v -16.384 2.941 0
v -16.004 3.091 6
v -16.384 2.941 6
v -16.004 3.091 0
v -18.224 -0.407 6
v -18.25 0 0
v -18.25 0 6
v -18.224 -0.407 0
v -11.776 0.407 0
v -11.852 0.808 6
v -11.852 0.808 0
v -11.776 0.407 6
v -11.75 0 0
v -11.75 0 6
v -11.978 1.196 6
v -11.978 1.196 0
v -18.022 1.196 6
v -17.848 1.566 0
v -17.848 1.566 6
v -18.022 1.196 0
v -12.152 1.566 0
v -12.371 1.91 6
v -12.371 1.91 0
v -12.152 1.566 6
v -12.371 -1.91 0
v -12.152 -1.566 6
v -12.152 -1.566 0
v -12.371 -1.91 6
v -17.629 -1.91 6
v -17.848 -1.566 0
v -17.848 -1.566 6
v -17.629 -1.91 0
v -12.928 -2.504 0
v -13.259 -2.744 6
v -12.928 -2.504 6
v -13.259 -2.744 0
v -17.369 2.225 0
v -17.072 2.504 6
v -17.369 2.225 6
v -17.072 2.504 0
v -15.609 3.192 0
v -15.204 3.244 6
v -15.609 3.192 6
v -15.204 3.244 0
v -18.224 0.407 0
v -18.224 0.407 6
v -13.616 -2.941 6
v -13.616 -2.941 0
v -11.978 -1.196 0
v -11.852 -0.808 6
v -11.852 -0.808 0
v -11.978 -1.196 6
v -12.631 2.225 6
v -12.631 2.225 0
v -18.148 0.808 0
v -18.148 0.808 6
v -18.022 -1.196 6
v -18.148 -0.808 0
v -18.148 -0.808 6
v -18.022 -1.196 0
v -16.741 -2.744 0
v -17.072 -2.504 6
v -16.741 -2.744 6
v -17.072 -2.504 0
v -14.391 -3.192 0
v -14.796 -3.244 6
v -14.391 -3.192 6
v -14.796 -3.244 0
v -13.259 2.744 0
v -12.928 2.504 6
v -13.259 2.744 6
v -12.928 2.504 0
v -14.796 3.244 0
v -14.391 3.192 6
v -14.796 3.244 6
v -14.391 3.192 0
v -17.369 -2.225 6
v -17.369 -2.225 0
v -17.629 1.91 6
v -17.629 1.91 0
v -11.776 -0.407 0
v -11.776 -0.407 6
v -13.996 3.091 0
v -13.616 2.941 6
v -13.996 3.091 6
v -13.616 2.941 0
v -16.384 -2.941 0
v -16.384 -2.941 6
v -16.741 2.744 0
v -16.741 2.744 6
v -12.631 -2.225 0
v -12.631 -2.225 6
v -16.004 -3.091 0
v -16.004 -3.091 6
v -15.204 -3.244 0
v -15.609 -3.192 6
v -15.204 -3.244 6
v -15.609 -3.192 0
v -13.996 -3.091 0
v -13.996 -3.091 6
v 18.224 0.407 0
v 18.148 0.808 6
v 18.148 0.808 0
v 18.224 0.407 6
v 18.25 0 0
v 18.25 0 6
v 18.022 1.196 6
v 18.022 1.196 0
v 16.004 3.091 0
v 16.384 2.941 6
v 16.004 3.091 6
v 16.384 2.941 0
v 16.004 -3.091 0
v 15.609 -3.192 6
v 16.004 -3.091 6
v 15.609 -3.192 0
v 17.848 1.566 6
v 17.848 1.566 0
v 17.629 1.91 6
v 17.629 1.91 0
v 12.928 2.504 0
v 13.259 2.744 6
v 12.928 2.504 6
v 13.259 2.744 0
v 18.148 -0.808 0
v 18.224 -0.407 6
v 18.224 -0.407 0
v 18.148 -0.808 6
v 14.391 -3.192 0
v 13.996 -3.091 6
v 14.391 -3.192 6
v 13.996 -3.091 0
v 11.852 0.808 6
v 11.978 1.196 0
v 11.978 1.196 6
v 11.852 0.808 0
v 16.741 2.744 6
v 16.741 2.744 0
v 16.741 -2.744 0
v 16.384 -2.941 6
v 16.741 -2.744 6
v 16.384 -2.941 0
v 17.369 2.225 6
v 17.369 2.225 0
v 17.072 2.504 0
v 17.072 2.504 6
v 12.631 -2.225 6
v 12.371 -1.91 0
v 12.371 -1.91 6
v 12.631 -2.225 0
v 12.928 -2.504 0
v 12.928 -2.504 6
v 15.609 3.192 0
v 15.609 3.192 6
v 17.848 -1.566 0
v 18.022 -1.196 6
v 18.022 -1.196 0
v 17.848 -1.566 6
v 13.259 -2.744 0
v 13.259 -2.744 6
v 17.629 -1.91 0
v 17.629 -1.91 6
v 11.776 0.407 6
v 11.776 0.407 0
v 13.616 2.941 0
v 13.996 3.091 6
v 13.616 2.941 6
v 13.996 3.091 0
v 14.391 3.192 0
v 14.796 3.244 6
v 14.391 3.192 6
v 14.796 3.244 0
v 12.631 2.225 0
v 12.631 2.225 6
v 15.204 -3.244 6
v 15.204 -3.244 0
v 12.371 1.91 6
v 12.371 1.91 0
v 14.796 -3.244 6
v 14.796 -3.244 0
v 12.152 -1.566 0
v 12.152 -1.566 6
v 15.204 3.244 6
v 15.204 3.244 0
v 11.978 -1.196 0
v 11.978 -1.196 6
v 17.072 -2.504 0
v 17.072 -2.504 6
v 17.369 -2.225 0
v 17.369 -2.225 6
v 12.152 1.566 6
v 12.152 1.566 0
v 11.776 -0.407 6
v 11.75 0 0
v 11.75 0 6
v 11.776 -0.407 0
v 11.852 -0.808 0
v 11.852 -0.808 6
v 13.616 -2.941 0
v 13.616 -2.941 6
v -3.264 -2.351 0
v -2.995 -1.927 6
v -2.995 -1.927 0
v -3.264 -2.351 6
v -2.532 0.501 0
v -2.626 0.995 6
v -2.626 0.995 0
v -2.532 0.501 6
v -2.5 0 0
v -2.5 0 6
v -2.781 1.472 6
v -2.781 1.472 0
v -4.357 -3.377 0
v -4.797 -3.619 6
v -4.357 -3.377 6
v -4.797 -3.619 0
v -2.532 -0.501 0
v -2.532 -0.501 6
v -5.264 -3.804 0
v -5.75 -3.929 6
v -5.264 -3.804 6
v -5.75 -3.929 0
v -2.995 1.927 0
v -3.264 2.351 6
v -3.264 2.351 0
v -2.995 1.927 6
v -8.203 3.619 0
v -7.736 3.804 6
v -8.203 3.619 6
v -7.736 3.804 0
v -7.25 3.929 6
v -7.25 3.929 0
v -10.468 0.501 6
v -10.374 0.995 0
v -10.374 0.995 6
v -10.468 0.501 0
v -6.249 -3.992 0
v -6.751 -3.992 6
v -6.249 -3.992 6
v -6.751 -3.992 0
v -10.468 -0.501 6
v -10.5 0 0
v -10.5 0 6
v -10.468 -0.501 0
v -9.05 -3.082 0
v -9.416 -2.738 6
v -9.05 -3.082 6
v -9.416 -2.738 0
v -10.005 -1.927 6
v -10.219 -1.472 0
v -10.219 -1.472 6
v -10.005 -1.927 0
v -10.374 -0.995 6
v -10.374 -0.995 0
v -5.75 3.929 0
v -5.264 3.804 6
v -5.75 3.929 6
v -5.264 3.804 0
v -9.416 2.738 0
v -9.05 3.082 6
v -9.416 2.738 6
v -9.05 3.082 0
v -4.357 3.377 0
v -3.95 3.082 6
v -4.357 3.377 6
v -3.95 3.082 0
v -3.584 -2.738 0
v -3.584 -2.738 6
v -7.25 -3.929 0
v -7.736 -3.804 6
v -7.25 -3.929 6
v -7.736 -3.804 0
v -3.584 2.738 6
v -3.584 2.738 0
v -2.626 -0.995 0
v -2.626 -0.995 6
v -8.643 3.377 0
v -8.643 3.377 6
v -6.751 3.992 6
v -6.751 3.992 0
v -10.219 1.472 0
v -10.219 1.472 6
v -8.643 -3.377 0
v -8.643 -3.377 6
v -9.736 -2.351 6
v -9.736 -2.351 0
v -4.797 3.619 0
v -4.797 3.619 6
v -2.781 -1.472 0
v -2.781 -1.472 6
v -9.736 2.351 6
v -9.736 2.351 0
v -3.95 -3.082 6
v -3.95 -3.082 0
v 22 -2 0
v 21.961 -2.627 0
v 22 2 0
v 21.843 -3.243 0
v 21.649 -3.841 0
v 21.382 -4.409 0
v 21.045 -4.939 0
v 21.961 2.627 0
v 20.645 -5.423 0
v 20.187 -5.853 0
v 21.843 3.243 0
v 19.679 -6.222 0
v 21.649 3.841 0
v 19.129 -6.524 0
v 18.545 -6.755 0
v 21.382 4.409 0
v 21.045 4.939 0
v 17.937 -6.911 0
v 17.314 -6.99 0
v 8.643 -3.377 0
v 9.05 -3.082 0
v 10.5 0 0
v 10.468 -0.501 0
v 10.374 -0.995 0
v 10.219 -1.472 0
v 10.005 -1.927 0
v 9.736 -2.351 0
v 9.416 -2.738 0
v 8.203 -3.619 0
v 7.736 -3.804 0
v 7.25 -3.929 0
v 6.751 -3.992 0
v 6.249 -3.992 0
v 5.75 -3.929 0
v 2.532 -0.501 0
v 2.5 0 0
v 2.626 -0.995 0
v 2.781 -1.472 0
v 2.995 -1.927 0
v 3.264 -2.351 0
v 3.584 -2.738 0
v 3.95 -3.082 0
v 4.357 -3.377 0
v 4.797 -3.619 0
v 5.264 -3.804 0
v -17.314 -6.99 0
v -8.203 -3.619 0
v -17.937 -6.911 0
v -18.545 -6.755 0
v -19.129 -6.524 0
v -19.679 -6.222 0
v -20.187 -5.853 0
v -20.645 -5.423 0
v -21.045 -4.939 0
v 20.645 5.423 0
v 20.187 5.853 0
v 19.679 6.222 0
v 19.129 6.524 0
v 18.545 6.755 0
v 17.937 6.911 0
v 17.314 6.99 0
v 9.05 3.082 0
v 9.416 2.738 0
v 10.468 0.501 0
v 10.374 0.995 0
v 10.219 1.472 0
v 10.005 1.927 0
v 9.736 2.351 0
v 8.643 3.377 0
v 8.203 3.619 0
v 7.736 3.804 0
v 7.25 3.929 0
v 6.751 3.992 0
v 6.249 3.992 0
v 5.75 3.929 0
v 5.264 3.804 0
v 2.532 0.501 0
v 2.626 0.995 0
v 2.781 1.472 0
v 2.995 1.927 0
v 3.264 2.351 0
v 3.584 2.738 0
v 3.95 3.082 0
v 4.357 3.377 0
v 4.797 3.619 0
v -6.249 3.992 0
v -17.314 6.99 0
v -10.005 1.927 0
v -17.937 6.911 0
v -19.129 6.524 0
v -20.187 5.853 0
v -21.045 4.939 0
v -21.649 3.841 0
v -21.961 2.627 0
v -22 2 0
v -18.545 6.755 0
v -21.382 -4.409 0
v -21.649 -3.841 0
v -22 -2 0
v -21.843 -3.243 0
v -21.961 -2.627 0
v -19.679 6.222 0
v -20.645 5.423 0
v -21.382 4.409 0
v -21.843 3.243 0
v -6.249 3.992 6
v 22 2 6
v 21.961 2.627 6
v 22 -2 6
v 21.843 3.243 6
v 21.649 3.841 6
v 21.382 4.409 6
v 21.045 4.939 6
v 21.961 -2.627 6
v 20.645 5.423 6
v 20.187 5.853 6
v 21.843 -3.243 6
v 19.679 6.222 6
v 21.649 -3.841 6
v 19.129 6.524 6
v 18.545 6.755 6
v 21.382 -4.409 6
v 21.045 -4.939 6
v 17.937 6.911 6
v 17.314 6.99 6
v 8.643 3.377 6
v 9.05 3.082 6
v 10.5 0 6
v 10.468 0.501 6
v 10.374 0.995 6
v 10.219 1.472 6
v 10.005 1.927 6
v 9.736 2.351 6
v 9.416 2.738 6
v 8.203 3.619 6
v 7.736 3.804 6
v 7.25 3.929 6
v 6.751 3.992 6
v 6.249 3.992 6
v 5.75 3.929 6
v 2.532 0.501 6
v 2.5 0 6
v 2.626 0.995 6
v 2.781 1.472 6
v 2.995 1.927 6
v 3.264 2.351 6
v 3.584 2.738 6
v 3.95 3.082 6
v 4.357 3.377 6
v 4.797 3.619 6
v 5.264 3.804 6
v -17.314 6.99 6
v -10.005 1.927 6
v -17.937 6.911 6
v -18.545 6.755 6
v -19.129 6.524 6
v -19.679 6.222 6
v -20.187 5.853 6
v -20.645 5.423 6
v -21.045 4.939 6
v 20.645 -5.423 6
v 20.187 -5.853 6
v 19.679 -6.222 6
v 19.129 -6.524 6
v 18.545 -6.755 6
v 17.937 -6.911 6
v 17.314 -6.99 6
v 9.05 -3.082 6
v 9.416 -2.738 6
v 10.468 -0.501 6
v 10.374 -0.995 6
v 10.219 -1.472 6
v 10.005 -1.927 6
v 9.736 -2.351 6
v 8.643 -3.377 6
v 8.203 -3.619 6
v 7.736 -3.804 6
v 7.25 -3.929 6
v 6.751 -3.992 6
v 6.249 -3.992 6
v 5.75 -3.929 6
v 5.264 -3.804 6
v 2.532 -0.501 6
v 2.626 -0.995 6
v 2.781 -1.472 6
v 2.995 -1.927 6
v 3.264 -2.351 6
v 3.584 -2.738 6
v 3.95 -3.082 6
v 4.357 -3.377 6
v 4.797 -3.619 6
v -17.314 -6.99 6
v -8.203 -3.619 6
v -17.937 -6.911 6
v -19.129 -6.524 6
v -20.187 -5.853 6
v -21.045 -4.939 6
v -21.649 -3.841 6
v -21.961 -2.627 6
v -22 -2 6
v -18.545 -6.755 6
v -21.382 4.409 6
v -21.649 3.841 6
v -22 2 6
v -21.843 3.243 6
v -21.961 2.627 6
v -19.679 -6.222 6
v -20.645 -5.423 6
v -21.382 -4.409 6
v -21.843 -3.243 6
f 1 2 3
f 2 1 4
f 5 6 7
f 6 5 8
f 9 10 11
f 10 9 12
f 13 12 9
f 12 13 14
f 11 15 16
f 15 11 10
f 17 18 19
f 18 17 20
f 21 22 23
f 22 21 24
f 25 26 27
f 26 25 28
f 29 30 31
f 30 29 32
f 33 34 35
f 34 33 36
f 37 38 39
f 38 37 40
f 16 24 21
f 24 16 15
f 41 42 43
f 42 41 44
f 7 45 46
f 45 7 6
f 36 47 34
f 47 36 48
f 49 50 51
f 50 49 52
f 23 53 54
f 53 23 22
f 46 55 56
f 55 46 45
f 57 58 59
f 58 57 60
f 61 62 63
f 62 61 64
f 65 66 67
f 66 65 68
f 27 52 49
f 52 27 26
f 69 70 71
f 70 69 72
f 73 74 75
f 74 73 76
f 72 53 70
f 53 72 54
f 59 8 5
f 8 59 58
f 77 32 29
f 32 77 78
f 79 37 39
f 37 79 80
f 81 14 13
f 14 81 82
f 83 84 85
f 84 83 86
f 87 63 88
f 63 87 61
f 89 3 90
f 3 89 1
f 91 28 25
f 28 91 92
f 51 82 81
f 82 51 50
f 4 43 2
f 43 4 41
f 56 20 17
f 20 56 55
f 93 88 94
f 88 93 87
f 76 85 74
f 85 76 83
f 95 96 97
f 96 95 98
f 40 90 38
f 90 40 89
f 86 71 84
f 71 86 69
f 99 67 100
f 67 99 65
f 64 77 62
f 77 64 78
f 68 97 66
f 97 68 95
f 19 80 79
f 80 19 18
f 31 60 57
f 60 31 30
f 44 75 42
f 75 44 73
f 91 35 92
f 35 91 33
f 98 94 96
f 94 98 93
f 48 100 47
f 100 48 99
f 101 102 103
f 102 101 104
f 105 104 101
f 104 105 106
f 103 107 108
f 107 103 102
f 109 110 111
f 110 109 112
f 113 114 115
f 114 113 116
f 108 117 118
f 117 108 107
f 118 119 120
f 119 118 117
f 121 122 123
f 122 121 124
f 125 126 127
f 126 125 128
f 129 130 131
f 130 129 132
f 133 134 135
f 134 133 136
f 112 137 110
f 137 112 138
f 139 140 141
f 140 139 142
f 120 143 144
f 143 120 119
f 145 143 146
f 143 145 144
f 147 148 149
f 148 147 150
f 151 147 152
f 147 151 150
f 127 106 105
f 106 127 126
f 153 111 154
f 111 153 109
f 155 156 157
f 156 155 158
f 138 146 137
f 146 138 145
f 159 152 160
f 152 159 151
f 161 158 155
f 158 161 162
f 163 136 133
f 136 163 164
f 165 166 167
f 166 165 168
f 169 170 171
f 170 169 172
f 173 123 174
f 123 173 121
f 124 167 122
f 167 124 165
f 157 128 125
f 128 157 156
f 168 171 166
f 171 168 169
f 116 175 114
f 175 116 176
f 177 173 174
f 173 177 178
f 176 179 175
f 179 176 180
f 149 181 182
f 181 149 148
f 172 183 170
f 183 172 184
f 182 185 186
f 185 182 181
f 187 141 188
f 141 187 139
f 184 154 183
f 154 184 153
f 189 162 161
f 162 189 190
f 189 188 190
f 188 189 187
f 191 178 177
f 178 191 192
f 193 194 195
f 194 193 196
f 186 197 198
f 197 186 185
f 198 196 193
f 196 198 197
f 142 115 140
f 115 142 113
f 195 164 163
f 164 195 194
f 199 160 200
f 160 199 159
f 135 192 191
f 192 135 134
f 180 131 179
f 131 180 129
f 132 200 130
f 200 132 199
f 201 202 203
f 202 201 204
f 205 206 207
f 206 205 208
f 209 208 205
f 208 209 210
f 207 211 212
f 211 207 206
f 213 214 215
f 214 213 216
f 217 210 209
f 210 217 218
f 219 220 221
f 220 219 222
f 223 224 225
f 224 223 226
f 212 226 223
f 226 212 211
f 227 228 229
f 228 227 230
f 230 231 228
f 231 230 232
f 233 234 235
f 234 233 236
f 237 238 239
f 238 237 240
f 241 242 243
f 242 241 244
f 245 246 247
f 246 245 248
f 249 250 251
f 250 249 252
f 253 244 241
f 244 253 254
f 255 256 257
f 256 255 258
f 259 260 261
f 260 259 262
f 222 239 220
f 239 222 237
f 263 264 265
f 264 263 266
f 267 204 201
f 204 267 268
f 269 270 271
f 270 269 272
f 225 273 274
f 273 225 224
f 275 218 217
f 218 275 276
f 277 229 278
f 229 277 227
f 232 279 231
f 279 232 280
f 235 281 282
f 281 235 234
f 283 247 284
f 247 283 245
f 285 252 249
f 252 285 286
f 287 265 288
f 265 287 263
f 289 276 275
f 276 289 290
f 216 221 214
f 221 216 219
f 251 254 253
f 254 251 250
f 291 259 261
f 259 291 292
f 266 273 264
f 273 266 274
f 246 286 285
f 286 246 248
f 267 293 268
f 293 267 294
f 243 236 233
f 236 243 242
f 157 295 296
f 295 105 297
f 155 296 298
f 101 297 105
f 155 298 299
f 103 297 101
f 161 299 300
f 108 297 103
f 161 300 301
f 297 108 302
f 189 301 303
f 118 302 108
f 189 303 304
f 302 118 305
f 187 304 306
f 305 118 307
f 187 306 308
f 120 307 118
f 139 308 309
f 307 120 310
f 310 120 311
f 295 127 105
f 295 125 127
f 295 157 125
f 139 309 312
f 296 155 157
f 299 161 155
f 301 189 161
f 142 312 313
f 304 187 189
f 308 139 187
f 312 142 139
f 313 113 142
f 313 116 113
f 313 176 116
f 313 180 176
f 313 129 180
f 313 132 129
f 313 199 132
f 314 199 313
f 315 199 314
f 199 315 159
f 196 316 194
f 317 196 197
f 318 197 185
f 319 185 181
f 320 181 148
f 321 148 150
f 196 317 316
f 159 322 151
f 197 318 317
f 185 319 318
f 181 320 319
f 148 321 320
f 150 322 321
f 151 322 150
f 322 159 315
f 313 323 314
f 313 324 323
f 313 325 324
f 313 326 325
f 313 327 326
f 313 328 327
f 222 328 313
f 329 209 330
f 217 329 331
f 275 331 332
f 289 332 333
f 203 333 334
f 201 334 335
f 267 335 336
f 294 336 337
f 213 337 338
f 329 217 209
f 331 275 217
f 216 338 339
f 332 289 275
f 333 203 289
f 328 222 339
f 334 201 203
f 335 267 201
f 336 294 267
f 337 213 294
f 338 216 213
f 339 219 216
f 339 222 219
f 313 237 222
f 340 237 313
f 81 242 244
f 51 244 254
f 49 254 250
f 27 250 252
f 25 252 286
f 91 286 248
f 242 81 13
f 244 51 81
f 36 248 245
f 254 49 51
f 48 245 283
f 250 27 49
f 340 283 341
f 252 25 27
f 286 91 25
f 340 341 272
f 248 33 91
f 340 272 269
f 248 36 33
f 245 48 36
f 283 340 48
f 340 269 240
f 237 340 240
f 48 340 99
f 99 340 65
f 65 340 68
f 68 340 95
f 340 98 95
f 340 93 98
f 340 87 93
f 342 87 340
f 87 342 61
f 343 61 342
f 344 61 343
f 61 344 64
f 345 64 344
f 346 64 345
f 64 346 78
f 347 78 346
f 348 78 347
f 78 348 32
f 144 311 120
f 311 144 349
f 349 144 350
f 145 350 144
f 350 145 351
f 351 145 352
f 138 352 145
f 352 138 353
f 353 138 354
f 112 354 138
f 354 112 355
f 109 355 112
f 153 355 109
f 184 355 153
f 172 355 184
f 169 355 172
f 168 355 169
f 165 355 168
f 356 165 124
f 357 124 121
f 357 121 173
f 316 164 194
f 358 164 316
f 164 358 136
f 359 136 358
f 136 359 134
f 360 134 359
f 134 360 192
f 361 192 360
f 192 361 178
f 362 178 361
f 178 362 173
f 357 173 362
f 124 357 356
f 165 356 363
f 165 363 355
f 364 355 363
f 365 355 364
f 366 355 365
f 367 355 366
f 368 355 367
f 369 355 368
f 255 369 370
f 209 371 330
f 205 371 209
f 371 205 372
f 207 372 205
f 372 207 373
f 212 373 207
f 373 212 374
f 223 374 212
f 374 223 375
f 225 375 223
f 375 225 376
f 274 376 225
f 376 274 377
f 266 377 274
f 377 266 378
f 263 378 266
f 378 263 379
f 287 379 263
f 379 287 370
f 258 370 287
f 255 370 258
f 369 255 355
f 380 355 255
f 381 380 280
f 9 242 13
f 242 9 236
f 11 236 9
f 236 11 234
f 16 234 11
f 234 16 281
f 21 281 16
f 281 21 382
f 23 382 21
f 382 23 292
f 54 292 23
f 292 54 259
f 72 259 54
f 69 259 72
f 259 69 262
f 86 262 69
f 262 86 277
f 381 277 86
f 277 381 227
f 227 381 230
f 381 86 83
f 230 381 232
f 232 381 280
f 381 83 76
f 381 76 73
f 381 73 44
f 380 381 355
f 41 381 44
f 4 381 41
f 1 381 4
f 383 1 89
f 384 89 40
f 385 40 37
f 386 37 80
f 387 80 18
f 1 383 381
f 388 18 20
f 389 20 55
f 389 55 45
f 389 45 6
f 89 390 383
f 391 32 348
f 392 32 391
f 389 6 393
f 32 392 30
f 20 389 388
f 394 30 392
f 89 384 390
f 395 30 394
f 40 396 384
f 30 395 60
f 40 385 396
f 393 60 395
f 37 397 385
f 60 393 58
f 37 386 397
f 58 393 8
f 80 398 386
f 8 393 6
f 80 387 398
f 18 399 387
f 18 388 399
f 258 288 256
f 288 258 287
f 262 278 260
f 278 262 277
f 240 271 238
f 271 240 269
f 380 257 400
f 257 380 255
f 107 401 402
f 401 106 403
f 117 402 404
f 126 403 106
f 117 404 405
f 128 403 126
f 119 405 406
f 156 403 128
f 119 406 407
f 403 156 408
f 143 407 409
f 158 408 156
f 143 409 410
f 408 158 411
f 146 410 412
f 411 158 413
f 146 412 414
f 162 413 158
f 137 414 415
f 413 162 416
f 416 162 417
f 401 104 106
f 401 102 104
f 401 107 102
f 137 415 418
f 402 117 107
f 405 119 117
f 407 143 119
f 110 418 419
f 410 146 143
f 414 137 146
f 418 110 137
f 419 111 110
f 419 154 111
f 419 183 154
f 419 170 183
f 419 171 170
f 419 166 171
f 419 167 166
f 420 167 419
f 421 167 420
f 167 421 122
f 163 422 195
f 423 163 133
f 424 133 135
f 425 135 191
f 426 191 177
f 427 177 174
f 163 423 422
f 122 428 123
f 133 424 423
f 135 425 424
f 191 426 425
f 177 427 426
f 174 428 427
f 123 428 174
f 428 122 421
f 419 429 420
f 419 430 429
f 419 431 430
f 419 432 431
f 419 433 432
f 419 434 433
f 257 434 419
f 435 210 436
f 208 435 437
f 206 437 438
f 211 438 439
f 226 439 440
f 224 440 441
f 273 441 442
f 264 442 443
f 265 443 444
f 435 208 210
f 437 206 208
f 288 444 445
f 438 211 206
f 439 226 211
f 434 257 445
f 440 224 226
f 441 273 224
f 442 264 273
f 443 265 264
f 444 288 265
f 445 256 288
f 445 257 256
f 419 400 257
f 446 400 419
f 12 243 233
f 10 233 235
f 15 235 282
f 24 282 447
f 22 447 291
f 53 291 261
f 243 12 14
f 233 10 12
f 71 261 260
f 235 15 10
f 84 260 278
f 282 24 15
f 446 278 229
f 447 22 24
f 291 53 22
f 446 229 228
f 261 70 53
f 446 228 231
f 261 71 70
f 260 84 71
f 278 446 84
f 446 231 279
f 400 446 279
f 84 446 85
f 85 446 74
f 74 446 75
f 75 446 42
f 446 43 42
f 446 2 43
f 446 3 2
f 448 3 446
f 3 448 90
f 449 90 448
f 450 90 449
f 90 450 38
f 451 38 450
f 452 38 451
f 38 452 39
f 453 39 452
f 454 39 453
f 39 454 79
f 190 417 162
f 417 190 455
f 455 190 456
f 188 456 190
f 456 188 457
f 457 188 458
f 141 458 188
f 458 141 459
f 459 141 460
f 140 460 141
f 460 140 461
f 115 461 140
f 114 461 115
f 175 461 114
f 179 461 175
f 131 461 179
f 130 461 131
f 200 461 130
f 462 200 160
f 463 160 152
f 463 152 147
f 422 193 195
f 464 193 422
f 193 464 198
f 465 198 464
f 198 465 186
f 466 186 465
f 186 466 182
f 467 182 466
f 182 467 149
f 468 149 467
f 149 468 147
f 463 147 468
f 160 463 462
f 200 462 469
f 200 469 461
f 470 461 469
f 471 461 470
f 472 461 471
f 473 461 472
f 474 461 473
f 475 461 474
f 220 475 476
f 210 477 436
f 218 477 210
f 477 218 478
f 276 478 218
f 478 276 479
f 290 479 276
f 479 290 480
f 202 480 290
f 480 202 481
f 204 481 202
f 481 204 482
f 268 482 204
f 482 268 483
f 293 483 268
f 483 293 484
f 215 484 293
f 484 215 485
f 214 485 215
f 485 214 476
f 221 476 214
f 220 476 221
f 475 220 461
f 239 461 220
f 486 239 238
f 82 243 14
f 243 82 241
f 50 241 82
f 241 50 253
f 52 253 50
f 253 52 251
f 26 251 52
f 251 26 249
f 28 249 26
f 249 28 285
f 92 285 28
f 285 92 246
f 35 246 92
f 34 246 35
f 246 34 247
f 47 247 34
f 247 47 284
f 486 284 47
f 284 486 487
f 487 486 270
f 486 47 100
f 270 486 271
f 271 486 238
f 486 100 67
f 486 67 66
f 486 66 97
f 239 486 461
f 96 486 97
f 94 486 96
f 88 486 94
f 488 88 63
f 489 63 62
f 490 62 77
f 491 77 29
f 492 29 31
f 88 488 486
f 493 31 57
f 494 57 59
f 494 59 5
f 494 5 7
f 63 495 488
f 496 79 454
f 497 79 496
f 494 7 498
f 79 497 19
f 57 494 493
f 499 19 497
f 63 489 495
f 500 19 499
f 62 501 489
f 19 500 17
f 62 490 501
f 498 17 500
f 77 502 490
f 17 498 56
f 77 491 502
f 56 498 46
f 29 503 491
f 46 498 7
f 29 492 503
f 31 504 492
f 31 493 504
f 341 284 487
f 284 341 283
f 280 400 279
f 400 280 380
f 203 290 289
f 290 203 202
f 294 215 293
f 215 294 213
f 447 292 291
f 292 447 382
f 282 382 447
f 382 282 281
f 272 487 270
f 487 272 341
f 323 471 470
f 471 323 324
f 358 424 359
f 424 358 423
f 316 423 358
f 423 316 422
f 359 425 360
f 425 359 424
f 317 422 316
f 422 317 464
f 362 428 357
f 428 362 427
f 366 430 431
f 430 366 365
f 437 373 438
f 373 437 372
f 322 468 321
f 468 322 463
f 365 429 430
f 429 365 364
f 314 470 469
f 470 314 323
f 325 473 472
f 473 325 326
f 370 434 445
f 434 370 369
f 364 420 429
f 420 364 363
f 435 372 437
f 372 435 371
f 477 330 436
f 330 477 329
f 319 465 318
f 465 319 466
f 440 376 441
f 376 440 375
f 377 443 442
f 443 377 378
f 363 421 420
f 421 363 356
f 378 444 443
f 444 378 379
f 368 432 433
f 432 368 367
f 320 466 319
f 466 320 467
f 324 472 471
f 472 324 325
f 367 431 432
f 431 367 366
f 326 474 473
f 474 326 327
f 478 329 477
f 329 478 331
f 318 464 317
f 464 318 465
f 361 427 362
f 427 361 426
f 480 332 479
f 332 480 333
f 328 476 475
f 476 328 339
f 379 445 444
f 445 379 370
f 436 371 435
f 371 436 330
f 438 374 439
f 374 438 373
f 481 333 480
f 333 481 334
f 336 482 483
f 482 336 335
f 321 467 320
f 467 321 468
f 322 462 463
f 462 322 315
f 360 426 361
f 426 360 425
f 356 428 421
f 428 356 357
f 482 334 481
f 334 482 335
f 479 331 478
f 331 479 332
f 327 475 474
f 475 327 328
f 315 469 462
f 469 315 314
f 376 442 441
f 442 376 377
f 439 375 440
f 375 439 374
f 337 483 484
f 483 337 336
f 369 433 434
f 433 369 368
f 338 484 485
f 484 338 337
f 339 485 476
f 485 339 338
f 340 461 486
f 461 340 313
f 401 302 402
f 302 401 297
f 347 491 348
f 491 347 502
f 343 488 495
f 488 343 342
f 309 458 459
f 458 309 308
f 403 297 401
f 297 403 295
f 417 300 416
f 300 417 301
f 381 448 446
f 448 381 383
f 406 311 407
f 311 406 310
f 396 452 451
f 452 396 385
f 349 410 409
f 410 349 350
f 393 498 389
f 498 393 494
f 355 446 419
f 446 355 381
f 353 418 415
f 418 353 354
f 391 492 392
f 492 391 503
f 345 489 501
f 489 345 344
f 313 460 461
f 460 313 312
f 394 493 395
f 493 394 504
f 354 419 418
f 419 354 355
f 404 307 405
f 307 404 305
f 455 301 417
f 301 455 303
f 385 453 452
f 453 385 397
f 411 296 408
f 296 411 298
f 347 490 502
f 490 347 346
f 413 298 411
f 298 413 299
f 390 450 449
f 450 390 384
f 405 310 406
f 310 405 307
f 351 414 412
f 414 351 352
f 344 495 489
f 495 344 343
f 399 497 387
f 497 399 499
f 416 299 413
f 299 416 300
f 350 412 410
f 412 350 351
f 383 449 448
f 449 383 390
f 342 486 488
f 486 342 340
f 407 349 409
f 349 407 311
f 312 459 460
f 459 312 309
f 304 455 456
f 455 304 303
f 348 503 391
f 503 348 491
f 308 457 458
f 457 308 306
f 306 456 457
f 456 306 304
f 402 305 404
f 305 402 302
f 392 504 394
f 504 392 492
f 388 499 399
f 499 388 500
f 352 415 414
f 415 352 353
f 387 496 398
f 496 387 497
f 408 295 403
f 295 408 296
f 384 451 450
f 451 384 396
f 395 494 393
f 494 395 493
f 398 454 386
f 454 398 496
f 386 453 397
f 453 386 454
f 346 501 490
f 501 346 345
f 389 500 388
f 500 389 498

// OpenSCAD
$fn = 50;


difference() {
	union() {
		hull() {
			translate(v = [-17.0000000000, 2.0000000000, 0]) {
				cylinder(h = 6, r = 5);
			}
			translate(v = [17.0000000000, 2.0000000000, 0]) {
				cylinder(h = 6, r = 5);
			}
			translate(v = [-17.0000000000, -2.0000000000, 0]) {
				cylinder(h = 6, r = 5);
			}
			translate(v = [17.0000000000, -2.0000000000, 0]) {
				cylinder(h = 6, r = 5);
			}
		}
	}
	union() {
		#translate(v = [-15.0000000000, 0.0000000000, 0]) {
			cylinder(h = 6, r = 3.2500000000);
		}
		#translate(v = [15.0000000000, 0.0000000000, 0]) {
			cylinder(h = 6, r = 3.2500000000);
		}
		#translate(v = [-15.0000000000, 0.0000000000, -100.0000000000]) {
			cylinder(h = 200, r = 3.2500000000);
		}
		#translate(v = [-15.0000000000, 0.0000000000, -100.0000000000]) {
			cylinder(h = 200, r = 3.2500000000);
		}
		#translate(v = [15.0000000000, 0.0000000000, -100.0000000000]) {
			cylinder(h = 200, r = 3.2500000000);
		}
		#translate(v = [15.0000000000, 0.0000000000, -100.0000000000]) {
			cylinder(h = 200, r = 3.2500000000);
		}
		#translate(v = [-15.0000000000, 0.0000000000, 0]) {
			cylinder(h = 6, r = 1.8000000000);
		}
		#translate(v = [15.0000000000, 0.0000000000, 0]) {
			cylinder(h = 6, r = 1.8000000000);
		}
		#translate(v = [-15.0000000000, 0.0000000000, 0]) {
			cylinder(h = 6, r = 1.8000000000);
		}
		#translate(v = [15.0000000000, 0.0000000000, 0]) {
			cylinder(h = 6, r = 1.8000000000);
		}
		#translate(v = [-15.0000000000, 0.0000000000, 0]) {
			cylinder(h = 6, r = 1.8000000000);
		}
		#translate(v = [15.0000000000, 0.0000000000, 0]) {
			cylinder(h = 6, r = 1.8000000000);
		}
		#translate(v = [-6.5000000000, 0, 0]) {
			cylinder(h = 6, r = 4.0000000000);
		}
		#translate(v = [6.5000000000, 0, 0]) {
			cylinder(h = 6, r = 4.0000000000);
		}
	}
}
